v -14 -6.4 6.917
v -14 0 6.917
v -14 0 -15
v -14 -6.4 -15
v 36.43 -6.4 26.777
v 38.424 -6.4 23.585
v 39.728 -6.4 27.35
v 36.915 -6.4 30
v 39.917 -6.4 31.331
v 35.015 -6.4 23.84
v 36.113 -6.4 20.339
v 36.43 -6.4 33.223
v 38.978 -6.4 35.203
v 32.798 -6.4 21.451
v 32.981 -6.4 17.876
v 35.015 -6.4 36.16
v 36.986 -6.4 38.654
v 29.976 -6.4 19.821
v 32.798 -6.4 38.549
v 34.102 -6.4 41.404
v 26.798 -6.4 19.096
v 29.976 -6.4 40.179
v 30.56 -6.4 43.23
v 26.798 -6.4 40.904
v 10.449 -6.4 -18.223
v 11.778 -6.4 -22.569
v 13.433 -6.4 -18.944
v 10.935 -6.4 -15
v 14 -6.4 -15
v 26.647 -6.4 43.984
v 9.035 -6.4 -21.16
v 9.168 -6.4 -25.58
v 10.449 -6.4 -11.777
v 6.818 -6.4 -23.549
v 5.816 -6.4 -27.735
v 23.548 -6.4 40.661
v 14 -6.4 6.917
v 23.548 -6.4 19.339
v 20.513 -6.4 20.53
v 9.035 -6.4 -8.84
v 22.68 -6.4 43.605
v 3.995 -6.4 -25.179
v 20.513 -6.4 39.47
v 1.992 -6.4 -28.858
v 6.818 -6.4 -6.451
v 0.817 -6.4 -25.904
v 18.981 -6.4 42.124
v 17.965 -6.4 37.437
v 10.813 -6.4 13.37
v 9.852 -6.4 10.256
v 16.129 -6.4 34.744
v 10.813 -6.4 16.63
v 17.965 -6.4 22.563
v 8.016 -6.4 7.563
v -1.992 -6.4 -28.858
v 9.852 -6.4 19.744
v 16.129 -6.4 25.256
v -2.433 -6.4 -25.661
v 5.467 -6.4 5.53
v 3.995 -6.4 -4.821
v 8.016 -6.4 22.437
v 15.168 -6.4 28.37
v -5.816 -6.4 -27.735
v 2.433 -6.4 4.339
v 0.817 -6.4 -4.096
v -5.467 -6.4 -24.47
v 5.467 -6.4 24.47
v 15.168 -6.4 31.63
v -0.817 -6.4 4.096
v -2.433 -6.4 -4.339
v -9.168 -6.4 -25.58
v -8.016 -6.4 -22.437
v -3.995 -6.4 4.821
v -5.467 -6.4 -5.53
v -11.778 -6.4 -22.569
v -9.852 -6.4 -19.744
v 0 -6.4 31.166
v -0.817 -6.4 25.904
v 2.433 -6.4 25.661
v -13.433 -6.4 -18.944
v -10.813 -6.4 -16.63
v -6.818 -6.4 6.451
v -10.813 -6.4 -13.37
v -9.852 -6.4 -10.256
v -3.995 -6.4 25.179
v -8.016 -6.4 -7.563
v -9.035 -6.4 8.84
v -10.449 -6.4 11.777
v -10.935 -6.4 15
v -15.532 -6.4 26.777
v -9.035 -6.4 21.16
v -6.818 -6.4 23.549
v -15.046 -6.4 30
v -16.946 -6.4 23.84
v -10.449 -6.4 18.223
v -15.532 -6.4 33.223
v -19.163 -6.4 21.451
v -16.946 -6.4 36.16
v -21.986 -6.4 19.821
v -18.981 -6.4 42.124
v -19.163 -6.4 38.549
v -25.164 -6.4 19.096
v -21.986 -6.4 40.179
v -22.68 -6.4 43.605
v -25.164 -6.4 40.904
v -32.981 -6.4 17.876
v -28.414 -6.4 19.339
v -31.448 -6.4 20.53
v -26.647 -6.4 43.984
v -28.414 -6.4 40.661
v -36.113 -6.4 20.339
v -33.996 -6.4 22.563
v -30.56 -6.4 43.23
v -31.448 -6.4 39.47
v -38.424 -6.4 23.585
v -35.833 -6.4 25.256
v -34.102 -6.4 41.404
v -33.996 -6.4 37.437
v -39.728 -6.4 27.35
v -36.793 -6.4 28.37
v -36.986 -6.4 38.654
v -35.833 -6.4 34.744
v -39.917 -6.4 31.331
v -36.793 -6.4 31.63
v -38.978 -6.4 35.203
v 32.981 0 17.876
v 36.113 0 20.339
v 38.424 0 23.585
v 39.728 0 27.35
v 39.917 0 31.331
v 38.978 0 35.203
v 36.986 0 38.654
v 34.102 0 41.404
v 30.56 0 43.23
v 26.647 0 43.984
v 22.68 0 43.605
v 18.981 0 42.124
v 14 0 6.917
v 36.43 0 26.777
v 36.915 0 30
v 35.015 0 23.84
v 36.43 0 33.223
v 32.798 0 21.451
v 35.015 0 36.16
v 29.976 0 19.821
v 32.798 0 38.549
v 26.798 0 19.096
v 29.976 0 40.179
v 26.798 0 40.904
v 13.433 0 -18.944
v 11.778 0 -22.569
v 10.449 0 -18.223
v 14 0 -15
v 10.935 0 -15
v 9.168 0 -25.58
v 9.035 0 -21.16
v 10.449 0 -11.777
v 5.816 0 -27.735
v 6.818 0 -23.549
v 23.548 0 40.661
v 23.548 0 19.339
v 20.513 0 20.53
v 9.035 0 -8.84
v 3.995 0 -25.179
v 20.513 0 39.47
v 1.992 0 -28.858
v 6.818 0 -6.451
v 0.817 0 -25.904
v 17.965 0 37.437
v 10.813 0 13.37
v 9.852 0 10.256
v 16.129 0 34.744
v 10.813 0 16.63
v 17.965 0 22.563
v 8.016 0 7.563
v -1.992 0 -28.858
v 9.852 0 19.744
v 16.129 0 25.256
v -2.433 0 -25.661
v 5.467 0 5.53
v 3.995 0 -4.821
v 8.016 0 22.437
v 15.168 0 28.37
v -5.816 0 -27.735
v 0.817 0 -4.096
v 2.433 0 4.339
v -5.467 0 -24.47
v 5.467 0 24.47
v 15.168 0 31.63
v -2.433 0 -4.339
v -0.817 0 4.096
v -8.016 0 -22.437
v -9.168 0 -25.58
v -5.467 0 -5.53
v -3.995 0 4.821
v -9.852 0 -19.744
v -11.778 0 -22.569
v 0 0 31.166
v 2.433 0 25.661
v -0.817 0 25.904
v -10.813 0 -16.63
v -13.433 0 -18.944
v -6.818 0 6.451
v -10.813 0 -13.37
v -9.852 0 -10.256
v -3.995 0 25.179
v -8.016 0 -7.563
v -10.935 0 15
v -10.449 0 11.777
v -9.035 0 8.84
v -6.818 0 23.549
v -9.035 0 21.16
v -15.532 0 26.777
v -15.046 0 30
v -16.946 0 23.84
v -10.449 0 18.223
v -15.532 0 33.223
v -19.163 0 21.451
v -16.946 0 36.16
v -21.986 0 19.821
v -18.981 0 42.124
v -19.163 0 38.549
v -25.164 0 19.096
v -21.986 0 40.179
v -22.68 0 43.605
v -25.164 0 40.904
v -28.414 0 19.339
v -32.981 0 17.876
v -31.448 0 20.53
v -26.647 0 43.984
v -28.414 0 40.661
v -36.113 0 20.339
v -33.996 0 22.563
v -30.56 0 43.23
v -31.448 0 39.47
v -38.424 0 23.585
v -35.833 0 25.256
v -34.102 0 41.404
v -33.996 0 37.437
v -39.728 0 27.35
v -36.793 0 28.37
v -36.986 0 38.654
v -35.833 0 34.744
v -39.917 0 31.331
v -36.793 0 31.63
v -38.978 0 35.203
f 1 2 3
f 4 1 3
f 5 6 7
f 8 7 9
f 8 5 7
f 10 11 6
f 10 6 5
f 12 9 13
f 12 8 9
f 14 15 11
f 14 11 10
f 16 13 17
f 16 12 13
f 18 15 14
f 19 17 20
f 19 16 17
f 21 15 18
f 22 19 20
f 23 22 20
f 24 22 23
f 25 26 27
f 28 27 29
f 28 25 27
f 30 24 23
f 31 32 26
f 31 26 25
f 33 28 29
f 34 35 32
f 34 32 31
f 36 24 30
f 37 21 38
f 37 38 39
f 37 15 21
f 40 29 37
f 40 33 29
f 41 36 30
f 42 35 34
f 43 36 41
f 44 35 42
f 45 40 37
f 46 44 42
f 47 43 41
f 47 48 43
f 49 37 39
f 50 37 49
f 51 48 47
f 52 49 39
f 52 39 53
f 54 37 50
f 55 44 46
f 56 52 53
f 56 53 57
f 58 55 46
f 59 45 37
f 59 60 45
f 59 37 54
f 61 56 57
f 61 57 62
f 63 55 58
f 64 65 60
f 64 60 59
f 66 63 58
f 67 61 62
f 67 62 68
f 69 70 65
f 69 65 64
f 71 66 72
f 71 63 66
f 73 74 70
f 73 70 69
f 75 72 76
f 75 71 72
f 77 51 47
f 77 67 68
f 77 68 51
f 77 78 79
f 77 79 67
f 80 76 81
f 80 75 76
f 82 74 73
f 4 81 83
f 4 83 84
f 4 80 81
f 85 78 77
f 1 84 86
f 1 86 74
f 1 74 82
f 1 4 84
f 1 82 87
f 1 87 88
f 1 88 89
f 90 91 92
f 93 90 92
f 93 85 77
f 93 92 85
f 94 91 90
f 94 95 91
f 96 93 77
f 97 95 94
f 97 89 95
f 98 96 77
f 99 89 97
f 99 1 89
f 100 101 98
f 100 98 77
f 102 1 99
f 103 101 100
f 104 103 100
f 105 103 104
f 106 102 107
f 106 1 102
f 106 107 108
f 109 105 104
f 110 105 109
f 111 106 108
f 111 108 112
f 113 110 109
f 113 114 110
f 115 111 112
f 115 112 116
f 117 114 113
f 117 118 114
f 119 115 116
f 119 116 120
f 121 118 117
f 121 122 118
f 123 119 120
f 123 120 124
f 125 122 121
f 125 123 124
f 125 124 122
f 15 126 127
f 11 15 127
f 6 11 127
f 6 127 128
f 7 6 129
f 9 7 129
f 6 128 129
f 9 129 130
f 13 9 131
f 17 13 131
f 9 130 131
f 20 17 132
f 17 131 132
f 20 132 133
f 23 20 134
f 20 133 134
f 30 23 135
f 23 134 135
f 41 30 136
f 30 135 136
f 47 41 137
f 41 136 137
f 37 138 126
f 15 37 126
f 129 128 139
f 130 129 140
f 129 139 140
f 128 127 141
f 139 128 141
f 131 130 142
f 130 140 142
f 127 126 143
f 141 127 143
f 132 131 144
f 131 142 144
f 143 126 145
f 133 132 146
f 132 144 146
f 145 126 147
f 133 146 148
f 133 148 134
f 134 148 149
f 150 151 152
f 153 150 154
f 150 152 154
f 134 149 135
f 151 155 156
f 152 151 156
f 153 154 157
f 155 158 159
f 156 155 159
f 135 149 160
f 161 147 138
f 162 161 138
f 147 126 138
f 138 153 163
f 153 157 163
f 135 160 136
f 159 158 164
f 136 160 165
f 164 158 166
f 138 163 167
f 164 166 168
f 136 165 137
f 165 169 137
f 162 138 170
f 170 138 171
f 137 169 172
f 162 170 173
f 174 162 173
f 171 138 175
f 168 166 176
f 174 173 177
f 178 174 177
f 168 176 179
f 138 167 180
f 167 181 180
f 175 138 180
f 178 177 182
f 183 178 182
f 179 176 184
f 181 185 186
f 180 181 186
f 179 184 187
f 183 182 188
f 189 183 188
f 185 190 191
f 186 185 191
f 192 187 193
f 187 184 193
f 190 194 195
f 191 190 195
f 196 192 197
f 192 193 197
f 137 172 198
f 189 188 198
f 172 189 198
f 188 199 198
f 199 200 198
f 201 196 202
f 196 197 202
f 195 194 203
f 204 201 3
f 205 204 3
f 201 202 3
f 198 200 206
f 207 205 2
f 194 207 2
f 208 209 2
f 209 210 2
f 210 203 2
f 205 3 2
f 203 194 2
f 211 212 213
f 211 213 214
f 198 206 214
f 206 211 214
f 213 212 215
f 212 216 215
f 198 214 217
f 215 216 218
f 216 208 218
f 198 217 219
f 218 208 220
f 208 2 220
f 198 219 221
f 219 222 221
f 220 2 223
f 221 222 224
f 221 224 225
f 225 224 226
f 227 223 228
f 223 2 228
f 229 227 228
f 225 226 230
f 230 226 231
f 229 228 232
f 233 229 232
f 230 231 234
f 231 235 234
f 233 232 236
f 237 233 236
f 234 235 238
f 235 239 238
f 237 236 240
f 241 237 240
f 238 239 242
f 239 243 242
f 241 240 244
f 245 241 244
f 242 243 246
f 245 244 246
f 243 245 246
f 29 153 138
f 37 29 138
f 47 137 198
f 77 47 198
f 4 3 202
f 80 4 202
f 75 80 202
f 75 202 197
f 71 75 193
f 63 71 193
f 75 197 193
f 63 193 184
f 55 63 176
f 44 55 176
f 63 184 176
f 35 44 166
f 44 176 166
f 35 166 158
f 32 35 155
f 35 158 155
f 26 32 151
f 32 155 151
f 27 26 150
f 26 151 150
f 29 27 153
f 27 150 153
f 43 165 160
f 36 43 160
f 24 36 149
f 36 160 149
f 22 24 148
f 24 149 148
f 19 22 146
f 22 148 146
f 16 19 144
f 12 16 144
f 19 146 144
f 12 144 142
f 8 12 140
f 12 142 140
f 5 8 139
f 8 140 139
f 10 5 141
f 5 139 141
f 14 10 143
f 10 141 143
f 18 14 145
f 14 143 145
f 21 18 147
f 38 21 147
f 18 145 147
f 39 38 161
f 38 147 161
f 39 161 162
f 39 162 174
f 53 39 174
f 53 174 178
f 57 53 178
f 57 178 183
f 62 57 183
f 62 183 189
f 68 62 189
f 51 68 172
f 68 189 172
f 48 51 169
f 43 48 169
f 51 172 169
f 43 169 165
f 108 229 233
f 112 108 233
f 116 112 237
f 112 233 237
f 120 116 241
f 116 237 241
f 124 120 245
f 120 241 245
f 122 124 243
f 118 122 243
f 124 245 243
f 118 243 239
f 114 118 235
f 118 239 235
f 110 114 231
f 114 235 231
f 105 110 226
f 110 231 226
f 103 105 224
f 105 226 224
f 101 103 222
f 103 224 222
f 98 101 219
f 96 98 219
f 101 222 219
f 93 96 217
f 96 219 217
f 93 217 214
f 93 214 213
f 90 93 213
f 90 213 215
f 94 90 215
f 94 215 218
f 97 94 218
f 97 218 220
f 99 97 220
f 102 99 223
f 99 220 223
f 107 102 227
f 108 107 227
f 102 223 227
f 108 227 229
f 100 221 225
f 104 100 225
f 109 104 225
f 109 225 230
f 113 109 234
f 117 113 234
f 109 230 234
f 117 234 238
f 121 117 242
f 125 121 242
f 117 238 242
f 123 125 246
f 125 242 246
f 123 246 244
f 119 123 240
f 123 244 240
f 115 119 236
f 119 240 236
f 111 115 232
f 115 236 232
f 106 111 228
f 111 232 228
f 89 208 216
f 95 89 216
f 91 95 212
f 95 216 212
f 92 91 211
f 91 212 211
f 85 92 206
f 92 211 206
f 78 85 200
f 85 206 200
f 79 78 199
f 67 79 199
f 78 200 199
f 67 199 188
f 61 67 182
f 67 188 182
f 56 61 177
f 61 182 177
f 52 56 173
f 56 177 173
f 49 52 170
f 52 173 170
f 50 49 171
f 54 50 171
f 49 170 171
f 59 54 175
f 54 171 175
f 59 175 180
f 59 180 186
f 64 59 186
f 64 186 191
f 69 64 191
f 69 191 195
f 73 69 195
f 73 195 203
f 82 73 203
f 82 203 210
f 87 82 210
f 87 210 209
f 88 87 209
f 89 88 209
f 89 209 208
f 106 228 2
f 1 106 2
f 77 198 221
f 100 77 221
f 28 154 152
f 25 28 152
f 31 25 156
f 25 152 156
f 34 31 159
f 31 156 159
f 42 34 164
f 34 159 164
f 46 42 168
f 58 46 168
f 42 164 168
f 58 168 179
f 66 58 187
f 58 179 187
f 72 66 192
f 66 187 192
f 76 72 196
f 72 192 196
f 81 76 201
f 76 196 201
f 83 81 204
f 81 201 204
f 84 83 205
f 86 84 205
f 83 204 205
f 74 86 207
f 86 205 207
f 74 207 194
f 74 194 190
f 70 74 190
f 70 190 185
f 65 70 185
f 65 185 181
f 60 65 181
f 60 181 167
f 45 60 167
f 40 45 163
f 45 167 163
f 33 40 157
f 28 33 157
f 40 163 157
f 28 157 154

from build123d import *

# Parameters (mm, degrees)
F1_DEPTH        = 6.4
F1_COPIES_COUNT = 3


# Not quite as in the source:
# - a feature of the source that left no trace in its solid (it failed there, or was rolled back) is left out
# - a pattern or mirror of a feature is missing from the dataset's text; its kind, count and spacing are read off the source's solid


with BuildPart() as f1:
    # F0 (on Front) → F1 (new body)
    with BuildSketch(Plane.XZ):
        with BuildLine():
            Line((10.9347, -15), (14, -15))
            ThreePointArc((14, -15), (0, -1), (-14, -15))
            Line((-14, -15), (-10.9347, -15))
            ThreePointArc((-10.9347, -15), (0, -4.0653), (10.9347, -15))
        make_face()
        with BuildLine():
            ThreePointArc((-14, -15), (0, -29), (14, -15))
            Line((14, -15), (10.9347, -15))
            ThreePointArc((10.9347, -15), (0, -25.9347), (-10.9347, -15))
            Line((-10.9347, -15), (-14, -15))
        make_face()
        with BuildLine():
            ThreePointArc((-14, -15), (0, -1), (14, -15))
            Line((14, -15), (14, 15))
            ThreePointArc((14, 15), (0, 1), (-14, 15))
            Line((-14, 15), (-14, -15))
        make_face()
        with BuildLine():
            ThreePointArc((-14, 15), (0, 1), (14, 15))
            Line((14, 15), (10.9347, 15))
            ThreePointArc((10.9347, 15), (0, 4.0653), (-10.9347, 15))
            Line((-10.9347, 15), (-14, 15))
        make_face()
        with BuildLine():
            Line((10.9347, 15), (14, 15))
            ThreePointArc((14, 15), (0, 29), (-14, 15))
            Line((-14, 15), (-10.9347, 15))
            ThreePointArc((-10.9347, 15), (0, 25.9347), (10.9347, 15))
        make_face()
    extrude(amount=F1_DEPTH)

    # F1_copies: F1 ×3 about axis
    f1_copies_axis = Axis((0, 0, 15), (0, 1, 0))


with BuildPart() as f1_1:
    add(f1.part)
    for i in range(1, F1_COPIES_COUNT):
        add(f1.part.rotate(f1_copies_axis, i * 360 / F1_COPIES_COUNT))


solid = f1_1.part
